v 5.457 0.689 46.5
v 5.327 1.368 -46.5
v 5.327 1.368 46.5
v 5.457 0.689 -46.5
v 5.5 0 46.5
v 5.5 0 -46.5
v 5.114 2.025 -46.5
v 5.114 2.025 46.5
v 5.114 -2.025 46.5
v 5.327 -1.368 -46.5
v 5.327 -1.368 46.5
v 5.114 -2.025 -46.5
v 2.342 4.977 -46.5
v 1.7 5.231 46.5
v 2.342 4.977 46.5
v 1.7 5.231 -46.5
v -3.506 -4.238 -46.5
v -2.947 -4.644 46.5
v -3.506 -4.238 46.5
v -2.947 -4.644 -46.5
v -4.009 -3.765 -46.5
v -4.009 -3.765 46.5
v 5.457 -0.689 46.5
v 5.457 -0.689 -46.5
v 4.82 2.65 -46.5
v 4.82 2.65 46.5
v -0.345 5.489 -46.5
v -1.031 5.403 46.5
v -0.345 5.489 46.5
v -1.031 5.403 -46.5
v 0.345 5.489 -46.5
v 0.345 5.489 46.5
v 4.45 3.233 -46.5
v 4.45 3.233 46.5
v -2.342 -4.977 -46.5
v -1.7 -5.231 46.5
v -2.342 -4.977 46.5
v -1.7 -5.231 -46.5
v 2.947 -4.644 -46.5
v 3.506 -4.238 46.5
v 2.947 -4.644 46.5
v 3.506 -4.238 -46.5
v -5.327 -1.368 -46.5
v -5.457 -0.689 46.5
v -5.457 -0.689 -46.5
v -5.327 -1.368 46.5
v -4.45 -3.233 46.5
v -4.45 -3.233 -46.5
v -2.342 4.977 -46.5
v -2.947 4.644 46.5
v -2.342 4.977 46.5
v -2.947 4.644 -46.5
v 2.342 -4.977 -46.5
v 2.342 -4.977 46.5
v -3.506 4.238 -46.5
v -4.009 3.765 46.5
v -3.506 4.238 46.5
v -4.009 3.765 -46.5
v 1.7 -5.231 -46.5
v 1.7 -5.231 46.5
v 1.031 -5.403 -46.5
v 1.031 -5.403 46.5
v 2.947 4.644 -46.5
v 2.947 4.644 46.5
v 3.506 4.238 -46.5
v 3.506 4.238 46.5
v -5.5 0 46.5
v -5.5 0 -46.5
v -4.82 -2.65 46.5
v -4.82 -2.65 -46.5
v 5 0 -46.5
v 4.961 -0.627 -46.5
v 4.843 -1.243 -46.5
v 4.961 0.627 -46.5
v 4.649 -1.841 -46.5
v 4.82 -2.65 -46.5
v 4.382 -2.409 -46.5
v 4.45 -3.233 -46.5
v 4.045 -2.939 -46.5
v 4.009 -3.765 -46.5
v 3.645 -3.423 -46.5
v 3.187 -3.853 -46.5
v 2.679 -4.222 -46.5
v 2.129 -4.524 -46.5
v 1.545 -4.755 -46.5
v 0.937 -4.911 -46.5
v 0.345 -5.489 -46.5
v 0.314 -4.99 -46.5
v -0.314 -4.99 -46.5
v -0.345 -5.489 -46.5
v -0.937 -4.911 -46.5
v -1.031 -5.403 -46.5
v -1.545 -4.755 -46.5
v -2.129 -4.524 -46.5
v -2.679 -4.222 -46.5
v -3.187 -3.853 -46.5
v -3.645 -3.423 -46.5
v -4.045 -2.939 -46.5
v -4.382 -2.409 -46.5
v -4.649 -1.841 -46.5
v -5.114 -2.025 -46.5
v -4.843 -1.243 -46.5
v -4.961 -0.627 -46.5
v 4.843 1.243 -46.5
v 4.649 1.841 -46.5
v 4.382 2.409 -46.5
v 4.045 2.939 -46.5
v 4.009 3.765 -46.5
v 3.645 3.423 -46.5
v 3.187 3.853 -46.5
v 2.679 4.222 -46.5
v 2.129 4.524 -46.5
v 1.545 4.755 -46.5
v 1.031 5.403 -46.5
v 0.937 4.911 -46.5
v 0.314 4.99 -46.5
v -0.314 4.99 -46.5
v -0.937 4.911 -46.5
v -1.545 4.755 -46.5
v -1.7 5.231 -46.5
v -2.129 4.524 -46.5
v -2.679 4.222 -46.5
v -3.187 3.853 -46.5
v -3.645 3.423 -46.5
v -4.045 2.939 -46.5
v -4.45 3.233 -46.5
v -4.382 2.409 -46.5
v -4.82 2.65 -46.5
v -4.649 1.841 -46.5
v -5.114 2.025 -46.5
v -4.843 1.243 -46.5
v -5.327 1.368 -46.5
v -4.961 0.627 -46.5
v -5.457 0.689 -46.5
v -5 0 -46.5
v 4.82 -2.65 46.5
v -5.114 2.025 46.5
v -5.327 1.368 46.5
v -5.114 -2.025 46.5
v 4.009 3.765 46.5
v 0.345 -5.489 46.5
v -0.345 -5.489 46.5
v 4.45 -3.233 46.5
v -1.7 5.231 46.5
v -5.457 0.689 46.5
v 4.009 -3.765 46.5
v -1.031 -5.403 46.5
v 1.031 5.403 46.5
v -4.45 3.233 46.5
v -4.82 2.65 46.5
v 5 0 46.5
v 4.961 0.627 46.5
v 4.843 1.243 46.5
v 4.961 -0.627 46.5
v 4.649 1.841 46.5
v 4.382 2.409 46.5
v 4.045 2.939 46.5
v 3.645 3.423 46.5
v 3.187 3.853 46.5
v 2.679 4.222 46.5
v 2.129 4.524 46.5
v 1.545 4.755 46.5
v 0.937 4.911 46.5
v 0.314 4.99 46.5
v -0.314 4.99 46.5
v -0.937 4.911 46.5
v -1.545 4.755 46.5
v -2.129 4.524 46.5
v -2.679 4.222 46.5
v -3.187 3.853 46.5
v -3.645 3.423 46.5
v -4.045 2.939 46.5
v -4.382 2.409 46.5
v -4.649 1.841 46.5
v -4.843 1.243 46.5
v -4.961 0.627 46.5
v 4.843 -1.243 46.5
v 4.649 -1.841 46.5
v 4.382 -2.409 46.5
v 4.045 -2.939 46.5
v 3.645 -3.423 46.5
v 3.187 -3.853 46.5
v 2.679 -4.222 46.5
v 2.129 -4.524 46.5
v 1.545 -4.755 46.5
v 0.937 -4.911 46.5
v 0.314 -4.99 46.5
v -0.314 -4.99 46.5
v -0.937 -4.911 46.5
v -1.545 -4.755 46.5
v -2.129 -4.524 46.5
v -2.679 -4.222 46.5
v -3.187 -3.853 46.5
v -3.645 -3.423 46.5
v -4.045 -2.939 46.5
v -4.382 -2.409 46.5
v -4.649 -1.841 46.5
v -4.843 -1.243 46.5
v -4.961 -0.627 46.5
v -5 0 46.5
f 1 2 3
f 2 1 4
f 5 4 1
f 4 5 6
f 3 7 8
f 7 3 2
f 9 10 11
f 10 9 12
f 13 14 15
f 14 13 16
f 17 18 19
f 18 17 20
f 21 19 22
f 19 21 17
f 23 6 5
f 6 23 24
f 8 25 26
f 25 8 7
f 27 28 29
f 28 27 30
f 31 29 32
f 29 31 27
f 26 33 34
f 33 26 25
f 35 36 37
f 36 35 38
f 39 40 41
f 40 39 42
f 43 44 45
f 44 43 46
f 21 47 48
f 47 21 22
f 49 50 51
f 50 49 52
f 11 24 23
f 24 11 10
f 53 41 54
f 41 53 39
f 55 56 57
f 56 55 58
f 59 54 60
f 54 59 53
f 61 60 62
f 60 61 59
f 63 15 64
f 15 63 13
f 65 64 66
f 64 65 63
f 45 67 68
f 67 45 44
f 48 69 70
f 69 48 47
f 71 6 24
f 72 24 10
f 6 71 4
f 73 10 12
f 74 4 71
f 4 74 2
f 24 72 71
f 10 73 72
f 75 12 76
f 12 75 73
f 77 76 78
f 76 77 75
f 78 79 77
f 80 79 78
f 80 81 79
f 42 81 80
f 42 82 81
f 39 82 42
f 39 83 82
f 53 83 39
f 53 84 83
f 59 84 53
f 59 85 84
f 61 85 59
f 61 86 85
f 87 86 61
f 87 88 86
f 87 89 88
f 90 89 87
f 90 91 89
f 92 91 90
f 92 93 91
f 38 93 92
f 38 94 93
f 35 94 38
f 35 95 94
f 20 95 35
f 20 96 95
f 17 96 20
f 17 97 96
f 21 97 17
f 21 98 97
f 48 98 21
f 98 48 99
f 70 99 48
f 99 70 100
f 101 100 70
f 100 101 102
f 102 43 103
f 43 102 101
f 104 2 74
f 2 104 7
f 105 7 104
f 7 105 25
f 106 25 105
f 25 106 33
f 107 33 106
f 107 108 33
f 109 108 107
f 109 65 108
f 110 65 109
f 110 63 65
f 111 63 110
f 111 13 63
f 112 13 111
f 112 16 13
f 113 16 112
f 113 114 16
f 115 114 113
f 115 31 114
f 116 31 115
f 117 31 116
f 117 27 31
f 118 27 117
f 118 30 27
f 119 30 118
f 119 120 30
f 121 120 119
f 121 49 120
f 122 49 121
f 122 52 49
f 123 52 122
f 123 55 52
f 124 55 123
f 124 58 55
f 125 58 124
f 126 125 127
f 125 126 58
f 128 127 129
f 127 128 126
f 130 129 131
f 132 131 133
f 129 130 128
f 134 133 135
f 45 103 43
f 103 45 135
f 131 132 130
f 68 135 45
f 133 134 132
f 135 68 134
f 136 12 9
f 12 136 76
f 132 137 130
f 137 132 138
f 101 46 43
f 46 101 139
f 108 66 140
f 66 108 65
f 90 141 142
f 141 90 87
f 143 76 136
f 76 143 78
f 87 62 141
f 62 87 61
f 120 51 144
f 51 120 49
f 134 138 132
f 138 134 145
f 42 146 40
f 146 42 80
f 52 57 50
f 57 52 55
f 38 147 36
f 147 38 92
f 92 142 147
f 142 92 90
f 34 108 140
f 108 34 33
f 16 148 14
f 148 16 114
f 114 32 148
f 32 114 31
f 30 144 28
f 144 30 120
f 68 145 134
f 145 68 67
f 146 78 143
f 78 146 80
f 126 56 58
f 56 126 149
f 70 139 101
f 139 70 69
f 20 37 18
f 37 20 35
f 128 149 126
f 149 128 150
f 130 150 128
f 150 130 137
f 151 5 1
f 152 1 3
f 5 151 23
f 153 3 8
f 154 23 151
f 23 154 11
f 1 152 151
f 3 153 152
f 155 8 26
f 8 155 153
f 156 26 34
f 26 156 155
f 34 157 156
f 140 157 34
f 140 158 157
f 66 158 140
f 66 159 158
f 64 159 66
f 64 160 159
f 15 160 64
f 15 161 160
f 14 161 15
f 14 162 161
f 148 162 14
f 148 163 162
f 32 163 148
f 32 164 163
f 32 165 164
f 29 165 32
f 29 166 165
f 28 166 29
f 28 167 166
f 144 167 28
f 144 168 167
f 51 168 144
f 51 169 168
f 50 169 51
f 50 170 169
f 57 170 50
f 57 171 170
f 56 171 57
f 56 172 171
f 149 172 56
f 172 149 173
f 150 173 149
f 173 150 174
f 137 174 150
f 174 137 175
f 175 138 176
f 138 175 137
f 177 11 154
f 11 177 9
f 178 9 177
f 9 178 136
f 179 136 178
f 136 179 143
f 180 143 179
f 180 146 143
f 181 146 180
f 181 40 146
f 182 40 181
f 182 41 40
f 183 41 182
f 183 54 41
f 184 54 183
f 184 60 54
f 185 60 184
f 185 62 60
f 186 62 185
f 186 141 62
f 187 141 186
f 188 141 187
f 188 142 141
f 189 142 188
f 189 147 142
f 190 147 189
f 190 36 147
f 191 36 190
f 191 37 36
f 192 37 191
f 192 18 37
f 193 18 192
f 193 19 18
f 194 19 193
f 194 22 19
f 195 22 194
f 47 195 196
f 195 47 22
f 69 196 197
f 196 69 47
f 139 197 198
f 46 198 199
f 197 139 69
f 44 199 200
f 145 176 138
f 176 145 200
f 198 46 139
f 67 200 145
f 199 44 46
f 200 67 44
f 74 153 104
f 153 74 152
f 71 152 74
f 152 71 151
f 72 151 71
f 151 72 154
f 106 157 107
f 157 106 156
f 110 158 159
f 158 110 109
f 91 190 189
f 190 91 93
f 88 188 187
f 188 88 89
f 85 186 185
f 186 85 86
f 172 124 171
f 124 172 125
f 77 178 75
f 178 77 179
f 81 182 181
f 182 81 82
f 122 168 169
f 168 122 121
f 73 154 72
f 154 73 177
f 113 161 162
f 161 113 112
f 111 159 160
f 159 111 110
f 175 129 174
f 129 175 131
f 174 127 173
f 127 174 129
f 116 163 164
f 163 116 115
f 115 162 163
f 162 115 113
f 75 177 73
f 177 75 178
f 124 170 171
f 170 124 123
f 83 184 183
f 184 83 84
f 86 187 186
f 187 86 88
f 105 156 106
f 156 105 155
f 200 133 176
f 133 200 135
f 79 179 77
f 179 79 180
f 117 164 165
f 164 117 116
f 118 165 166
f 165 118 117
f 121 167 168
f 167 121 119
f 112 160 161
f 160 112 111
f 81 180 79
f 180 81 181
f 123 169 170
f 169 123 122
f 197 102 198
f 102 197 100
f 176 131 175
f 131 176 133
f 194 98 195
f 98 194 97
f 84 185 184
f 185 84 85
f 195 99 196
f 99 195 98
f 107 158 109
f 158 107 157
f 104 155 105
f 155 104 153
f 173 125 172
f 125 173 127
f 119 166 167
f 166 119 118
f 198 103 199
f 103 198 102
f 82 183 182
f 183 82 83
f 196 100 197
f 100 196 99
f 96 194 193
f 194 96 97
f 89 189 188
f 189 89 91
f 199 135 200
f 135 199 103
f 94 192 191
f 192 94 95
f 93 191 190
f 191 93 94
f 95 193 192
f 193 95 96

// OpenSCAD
$fn = 50;


difference() {
	union() {
		translate(v = [0, 0, -46.5000000000]) {
			cylinder(h = 93, r = 5.5000000000);
		}
	}
	union() {
		translate(v = [0, 0, -100.0000000000]) {
			cylinder(h = 200, r = 5.0000000000);
		}
	}
}
